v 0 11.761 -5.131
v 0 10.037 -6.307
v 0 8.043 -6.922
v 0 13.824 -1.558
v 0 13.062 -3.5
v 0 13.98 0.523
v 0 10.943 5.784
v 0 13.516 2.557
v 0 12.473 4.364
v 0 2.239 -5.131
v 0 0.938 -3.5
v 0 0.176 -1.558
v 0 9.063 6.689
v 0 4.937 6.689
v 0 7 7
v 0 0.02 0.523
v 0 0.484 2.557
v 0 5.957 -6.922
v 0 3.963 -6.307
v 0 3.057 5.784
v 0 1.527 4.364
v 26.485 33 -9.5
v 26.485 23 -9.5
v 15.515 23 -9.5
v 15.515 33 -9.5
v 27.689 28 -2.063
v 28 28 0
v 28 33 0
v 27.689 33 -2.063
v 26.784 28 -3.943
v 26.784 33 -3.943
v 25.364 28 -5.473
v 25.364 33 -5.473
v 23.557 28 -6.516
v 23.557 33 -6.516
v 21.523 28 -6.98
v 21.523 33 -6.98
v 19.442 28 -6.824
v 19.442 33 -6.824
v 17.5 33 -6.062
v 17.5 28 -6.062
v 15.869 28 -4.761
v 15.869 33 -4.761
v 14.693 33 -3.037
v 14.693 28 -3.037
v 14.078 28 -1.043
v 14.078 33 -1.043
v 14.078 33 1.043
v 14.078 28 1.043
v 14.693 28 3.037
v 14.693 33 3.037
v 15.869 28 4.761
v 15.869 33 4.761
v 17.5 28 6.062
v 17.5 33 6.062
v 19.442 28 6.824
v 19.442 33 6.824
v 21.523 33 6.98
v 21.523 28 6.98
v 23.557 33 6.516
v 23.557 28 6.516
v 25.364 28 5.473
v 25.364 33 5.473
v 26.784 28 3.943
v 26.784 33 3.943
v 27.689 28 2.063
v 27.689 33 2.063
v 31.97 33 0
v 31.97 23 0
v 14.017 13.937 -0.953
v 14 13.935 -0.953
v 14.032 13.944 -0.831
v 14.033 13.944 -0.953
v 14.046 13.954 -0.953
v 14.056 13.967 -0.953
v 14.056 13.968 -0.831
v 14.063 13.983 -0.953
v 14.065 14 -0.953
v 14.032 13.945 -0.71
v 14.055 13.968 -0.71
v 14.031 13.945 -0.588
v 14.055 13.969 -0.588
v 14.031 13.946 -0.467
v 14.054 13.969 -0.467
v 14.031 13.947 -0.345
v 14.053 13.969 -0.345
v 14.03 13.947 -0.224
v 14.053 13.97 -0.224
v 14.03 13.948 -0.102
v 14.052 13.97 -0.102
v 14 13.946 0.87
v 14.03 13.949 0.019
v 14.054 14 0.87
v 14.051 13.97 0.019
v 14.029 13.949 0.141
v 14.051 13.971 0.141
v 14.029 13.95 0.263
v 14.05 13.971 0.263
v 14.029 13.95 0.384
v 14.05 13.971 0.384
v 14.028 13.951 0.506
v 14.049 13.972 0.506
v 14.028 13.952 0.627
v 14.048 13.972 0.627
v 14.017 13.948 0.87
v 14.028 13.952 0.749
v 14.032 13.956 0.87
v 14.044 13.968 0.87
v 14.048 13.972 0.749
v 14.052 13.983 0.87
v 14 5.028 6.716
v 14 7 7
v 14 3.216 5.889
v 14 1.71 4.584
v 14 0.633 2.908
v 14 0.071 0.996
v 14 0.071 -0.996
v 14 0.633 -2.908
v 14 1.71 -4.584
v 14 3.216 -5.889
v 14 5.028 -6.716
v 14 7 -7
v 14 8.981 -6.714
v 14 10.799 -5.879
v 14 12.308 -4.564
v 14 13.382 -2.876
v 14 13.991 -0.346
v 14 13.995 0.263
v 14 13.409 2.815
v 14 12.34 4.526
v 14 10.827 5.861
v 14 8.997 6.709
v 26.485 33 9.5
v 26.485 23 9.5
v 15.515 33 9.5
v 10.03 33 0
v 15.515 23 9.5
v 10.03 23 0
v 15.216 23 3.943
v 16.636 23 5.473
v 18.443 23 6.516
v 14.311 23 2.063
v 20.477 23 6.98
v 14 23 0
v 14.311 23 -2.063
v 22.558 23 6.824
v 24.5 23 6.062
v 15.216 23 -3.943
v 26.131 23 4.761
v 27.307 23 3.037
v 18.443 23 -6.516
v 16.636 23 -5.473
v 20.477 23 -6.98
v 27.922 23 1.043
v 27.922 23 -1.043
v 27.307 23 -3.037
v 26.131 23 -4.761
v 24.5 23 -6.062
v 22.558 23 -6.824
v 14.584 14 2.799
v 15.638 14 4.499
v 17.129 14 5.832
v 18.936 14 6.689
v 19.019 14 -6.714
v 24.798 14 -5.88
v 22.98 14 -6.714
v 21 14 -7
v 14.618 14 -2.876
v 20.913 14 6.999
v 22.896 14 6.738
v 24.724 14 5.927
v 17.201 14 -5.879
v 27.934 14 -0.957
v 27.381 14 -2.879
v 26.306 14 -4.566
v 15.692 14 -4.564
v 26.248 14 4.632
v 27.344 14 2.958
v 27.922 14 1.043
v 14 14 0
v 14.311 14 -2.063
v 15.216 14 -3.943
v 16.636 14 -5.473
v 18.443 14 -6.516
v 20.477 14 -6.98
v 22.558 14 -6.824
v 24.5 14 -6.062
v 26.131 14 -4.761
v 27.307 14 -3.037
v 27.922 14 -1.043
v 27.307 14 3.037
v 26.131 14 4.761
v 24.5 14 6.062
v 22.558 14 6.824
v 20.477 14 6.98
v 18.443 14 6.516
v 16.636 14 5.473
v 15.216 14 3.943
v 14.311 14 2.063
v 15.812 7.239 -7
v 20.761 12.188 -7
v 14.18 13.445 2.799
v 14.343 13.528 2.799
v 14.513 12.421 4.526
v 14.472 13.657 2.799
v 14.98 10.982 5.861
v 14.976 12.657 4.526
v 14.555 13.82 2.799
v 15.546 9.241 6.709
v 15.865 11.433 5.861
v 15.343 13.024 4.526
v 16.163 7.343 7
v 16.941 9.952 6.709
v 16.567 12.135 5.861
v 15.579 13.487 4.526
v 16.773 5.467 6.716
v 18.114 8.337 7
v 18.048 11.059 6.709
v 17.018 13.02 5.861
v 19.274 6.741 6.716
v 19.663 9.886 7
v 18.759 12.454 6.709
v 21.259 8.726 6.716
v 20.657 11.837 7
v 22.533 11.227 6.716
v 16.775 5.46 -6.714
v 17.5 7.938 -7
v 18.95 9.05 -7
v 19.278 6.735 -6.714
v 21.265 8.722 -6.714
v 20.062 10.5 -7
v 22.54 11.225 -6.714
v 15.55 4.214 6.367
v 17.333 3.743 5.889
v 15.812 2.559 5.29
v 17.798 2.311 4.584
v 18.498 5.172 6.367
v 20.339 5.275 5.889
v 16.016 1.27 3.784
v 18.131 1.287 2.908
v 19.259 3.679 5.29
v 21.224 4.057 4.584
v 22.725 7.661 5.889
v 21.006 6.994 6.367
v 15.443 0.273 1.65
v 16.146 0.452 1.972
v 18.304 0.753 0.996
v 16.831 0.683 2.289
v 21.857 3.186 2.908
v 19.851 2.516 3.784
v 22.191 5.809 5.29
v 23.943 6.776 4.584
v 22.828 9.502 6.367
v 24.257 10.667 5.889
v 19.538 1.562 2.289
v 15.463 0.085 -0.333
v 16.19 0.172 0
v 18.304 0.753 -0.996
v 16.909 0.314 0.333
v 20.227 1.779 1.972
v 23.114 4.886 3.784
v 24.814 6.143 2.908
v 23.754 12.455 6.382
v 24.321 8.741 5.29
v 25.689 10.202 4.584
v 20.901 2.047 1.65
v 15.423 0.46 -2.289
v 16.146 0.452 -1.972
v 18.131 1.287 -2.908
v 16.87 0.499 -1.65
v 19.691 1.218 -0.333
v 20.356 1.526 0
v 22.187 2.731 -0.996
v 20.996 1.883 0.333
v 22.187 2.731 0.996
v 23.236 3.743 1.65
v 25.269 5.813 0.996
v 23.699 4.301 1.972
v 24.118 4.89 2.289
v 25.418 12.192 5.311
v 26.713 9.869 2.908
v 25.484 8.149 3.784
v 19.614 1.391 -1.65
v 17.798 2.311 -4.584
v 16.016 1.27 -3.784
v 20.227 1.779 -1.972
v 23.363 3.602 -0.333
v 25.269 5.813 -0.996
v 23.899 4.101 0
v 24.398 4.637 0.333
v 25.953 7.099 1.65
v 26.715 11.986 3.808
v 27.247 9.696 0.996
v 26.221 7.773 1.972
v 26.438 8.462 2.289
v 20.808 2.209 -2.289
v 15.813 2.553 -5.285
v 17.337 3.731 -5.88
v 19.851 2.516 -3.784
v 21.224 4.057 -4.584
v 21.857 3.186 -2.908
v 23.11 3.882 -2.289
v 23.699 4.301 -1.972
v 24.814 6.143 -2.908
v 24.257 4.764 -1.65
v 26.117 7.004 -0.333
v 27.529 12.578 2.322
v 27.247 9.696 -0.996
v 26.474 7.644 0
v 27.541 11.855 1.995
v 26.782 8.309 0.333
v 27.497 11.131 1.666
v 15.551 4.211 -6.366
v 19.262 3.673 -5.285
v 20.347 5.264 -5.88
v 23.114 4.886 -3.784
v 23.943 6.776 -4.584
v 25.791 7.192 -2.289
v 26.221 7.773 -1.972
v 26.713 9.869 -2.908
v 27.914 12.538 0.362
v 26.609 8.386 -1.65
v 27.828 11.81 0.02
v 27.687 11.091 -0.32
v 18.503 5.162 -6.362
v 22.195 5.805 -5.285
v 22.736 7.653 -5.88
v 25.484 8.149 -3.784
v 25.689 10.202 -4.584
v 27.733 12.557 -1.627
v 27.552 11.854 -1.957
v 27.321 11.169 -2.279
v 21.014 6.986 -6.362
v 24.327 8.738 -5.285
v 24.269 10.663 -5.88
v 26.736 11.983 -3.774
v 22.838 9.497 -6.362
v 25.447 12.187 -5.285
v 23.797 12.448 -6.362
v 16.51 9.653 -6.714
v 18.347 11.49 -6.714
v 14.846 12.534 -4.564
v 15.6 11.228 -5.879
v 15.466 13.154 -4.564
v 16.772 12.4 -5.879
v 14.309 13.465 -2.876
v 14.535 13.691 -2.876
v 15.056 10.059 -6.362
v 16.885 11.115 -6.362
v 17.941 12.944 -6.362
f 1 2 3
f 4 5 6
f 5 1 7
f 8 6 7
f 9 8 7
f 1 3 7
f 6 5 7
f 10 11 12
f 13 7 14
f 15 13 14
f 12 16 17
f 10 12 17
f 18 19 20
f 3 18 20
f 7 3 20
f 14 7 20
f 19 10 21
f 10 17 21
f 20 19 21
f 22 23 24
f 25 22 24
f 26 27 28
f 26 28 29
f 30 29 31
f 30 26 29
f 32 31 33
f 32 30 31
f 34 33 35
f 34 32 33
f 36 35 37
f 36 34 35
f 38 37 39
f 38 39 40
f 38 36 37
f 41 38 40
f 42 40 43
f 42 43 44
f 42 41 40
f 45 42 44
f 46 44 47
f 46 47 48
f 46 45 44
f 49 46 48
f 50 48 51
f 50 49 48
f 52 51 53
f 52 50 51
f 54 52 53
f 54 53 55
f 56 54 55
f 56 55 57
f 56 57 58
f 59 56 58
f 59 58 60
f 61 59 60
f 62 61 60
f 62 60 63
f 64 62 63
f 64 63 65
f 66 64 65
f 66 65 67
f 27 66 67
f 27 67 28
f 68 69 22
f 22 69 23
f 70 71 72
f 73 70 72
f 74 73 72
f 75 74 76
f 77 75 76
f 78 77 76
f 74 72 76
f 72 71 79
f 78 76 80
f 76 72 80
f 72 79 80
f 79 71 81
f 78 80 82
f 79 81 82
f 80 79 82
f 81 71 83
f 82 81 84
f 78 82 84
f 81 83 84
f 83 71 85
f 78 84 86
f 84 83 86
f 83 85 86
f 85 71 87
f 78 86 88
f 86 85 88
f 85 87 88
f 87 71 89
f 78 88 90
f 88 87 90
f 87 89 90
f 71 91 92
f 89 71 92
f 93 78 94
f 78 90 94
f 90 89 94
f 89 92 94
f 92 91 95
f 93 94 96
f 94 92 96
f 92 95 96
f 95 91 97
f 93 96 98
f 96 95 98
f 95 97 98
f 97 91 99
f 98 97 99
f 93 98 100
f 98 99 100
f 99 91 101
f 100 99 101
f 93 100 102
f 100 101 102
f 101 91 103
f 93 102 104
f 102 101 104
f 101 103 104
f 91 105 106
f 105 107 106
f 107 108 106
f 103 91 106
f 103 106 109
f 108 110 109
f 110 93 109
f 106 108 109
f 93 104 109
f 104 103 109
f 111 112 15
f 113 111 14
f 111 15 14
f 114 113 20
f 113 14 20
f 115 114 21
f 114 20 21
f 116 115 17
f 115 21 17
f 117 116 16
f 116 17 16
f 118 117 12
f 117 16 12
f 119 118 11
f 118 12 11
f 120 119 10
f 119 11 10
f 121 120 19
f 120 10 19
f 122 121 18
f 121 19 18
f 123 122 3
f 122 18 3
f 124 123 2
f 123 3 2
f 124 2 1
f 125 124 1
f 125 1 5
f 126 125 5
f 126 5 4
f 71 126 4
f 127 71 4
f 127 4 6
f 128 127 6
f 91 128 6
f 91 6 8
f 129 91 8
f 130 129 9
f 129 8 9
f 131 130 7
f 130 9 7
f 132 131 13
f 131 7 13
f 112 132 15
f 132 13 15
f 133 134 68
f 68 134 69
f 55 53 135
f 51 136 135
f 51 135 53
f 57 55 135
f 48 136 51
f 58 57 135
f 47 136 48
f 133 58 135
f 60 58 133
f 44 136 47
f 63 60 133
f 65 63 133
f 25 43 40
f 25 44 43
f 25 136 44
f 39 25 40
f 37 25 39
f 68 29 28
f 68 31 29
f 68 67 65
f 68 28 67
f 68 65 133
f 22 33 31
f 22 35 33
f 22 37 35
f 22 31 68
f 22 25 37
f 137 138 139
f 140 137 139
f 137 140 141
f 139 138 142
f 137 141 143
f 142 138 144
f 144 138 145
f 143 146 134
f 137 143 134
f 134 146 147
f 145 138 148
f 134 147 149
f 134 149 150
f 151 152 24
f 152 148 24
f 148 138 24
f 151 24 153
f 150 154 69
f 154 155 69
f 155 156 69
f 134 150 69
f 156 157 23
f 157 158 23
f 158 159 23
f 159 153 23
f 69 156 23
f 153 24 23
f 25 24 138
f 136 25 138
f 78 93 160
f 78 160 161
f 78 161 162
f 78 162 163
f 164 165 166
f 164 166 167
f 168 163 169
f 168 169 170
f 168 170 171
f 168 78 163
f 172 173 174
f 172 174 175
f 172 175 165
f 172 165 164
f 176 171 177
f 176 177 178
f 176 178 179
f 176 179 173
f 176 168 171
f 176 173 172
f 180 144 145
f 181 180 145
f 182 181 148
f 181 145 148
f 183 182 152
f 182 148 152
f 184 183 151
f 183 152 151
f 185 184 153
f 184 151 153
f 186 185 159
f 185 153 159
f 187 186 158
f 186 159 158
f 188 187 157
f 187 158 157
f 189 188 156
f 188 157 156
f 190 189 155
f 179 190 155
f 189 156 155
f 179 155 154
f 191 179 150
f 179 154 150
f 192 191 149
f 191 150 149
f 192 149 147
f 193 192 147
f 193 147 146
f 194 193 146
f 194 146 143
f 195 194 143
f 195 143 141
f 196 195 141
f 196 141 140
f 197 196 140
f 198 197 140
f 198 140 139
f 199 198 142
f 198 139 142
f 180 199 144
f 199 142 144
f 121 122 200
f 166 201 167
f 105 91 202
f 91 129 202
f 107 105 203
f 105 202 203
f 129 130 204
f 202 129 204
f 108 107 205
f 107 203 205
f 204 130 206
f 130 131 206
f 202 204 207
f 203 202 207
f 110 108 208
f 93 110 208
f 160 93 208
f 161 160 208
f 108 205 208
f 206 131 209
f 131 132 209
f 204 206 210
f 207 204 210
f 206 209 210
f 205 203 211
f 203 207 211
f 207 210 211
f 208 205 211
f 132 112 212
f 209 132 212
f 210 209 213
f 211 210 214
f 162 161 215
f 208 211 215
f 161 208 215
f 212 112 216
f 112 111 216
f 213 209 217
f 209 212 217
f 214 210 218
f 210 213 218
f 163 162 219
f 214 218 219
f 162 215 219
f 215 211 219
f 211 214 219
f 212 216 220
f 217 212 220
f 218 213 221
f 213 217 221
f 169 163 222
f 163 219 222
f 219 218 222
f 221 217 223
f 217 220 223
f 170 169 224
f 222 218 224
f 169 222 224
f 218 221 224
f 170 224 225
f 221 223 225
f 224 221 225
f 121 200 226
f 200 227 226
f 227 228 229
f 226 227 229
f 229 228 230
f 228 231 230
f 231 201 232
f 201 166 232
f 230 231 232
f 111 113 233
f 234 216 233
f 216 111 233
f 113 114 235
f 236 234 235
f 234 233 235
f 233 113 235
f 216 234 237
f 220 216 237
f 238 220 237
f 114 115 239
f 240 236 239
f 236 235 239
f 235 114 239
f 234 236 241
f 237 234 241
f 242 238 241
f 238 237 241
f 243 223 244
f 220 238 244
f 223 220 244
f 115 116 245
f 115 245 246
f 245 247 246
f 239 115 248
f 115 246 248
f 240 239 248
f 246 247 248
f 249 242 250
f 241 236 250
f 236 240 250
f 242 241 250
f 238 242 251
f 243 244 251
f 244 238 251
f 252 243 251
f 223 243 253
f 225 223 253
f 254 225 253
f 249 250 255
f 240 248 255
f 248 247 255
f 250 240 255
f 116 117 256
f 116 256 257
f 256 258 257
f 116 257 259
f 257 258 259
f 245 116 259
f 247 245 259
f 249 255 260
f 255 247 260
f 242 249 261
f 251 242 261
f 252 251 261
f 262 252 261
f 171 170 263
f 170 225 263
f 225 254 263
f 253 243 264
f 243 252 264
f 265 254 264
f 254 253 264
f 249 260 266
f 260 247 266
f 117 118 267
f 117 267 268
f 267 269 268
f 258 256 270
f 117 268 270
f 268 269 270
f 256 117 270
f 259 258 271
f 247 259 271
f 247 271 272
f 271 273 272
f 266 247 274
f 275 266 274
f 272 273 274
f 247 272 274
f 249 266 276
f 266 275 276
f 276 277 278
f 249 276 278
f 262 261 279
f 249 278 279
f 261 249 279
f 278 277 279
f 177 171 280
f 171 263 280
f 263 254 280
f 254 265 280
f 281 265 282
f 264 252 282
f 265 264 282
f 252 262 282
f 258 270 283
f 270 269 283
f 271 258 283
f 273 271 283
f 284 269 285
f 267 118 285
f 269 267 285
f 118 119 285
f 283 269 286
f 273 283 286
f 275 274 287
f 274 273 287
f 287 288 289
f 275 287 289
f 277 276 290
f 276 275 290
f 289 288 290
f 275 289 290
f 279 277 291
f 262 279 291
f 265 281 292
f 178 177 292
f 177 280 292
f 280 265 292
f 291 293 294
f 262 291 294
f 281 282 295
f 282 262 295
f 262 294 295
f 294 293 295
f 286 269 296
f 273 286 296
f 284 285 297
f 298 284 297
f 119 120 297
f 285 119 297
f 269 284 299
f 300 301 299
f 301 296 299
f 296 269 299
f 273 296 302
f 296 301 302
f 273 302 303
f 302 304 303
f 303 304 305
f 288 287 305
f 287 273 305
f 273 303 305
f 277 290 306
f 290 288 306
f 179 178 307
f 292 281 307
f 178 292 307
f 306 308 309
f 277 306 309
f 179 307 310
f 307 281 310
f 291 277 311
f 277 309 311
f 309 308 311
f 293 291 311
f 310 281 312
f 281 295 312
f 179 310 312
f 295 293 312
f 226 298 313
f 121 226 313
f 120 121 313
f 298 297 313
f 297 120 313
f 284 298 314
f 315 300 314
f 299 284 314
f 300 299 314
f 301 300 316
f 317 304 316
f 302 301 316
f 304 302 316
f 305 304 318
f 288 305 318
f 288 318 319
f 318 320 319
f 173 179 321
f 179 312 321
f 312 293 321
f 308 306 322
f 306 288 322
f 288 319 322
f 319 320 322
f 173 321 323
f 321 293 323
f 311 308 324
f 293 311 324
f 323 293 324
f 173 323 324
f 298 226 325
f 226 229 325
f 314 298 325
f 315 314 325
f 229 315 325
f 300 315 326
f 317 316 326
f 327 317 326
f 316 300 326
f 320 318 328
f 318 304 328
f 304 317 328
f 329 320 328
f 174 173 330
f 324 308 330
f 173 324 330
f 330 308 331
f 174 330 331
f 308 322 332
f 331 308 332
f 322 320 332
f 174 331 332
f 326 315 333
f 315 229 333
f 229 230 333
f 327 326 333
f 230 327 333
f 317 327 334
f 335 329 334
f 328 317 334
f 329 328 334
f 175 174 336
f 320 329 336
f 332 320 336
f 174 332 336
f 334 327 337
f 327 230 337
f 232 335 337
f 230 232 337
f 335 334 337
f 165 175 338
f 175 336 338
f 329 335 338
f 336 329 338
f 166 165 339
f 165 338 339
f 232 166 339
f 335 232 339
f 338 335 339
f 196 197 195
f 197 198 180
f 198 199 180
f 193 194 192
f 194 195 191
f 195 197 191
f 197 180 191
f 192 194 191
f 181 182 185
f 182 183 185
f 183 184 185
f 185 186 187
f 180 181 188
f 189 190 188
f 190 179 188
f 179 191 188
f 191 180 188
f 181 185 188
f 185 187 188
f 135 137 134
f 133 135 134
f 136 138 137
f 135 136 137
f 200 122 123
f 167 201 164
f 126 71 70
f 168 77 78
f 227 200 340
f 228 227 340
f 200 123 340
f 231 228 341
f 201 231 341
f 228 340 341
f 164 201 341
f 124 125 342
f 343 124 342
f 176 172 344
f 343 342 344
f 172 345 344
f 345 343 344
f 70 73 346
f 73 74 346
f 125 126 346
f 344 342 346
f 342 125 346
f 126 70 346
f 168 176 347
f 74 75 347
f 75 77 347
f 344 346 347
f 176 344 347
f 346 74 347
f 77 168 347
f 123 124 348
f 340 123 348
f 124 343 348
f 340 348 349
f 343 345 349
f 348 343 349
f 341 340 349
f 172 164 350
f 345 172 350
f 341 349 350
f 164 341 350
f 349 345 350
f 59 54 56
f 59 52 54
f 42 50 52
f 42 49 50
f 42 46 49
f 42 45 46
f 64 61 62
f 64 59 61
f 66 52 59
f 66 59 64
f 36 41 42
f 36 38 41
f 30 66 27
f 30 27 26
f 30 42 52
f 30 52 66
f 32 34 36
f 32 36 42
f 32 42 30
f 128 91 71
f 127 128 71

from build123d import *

# Parameters (mm, degrees)
SZKIC1_W                         = 7
SZKIC1_H                         = 14
OBR_T10_ANGLE                    = 90
DODANIE_WYCI_GNI_CIE1_DEPTH      = 5
DODANIE_WYCI_GNI_CIE1_DEPTH_BACK = 5
SZKIC7_R                         = 7


with BuildPart() as part:
    # Szkic1 → Obrót1 (revolve)
    with BuildSketch(Plane.XY):
        with Locations((24.5, 21)):
            Rectangle(SZKIC1_W, SZKIC1_H)
    revolve(axis=Axis((21, 28, 0), (0, -1, 0)))

    # Szkic7 → Dodanie-wyciągnięcie1 (add, two sides: drawn at the far end of the back side and taken through both)
    with BuildSketch(Plane(origin=(0, 28, 0), x_dir=(1, 0, 0), z_dir=(0, 1, 0)).offset(-DODANIE_WYCI_GNI_CIE1_DEPTH_BACK)):
        Polygon((15.515172443, 9.5), (10.030344885, 0), (15.515172443, -9.5), (26.484827557, -9.5), (31.969655115, 0), (26.484827557, 9.5), align=None)
        with Locations((21, 0)):
            Circle(SZKIC7_R, mode=Mode.SUBTRACT)
    extrude(amount=DODANIE_WYCI_GNI_CIE1_DEPTH + DODANIE_WYCI_GNI_CIE1_DEPTH_BACK)


with BuildPart() as body_2:
    # Szkic1<4> → Obrót2 (revolve)
    with BuildSketch(Plane.XY):
        Polygon((0, 7), (14, 7), (14, 14), (0, 14), (0, 12), align=None)
    revolve(axis=Axis((0, 7, 0), (1, 0, 0)))

    # Szkic5 → Obrót10 (revolve)
    with BuildSketch(Plane(origin=(14, 0, 0), x_dir=(0, 0, -1), z_dir=(1, 0, 0))):
        with BuildLine():
            Line((0.952614833, 13.934877431), (-0.8700852, 13.945714632))
            ThreePointArc((-0.8700852, 13.945714632), (-4.631922041, 1.751638522), (7, 7))
            ThreePointArc((7, 7), (5.275808177, 11.600635617), (0.952614833, 13.934877431))
        make_face()
    revolve(axis=Axis((14, 14, 8.415380056), (0, 0, 1)), revolution_arc=OBR_T10_ANGLE)


solid = Compound([part.part, body_2.part])
